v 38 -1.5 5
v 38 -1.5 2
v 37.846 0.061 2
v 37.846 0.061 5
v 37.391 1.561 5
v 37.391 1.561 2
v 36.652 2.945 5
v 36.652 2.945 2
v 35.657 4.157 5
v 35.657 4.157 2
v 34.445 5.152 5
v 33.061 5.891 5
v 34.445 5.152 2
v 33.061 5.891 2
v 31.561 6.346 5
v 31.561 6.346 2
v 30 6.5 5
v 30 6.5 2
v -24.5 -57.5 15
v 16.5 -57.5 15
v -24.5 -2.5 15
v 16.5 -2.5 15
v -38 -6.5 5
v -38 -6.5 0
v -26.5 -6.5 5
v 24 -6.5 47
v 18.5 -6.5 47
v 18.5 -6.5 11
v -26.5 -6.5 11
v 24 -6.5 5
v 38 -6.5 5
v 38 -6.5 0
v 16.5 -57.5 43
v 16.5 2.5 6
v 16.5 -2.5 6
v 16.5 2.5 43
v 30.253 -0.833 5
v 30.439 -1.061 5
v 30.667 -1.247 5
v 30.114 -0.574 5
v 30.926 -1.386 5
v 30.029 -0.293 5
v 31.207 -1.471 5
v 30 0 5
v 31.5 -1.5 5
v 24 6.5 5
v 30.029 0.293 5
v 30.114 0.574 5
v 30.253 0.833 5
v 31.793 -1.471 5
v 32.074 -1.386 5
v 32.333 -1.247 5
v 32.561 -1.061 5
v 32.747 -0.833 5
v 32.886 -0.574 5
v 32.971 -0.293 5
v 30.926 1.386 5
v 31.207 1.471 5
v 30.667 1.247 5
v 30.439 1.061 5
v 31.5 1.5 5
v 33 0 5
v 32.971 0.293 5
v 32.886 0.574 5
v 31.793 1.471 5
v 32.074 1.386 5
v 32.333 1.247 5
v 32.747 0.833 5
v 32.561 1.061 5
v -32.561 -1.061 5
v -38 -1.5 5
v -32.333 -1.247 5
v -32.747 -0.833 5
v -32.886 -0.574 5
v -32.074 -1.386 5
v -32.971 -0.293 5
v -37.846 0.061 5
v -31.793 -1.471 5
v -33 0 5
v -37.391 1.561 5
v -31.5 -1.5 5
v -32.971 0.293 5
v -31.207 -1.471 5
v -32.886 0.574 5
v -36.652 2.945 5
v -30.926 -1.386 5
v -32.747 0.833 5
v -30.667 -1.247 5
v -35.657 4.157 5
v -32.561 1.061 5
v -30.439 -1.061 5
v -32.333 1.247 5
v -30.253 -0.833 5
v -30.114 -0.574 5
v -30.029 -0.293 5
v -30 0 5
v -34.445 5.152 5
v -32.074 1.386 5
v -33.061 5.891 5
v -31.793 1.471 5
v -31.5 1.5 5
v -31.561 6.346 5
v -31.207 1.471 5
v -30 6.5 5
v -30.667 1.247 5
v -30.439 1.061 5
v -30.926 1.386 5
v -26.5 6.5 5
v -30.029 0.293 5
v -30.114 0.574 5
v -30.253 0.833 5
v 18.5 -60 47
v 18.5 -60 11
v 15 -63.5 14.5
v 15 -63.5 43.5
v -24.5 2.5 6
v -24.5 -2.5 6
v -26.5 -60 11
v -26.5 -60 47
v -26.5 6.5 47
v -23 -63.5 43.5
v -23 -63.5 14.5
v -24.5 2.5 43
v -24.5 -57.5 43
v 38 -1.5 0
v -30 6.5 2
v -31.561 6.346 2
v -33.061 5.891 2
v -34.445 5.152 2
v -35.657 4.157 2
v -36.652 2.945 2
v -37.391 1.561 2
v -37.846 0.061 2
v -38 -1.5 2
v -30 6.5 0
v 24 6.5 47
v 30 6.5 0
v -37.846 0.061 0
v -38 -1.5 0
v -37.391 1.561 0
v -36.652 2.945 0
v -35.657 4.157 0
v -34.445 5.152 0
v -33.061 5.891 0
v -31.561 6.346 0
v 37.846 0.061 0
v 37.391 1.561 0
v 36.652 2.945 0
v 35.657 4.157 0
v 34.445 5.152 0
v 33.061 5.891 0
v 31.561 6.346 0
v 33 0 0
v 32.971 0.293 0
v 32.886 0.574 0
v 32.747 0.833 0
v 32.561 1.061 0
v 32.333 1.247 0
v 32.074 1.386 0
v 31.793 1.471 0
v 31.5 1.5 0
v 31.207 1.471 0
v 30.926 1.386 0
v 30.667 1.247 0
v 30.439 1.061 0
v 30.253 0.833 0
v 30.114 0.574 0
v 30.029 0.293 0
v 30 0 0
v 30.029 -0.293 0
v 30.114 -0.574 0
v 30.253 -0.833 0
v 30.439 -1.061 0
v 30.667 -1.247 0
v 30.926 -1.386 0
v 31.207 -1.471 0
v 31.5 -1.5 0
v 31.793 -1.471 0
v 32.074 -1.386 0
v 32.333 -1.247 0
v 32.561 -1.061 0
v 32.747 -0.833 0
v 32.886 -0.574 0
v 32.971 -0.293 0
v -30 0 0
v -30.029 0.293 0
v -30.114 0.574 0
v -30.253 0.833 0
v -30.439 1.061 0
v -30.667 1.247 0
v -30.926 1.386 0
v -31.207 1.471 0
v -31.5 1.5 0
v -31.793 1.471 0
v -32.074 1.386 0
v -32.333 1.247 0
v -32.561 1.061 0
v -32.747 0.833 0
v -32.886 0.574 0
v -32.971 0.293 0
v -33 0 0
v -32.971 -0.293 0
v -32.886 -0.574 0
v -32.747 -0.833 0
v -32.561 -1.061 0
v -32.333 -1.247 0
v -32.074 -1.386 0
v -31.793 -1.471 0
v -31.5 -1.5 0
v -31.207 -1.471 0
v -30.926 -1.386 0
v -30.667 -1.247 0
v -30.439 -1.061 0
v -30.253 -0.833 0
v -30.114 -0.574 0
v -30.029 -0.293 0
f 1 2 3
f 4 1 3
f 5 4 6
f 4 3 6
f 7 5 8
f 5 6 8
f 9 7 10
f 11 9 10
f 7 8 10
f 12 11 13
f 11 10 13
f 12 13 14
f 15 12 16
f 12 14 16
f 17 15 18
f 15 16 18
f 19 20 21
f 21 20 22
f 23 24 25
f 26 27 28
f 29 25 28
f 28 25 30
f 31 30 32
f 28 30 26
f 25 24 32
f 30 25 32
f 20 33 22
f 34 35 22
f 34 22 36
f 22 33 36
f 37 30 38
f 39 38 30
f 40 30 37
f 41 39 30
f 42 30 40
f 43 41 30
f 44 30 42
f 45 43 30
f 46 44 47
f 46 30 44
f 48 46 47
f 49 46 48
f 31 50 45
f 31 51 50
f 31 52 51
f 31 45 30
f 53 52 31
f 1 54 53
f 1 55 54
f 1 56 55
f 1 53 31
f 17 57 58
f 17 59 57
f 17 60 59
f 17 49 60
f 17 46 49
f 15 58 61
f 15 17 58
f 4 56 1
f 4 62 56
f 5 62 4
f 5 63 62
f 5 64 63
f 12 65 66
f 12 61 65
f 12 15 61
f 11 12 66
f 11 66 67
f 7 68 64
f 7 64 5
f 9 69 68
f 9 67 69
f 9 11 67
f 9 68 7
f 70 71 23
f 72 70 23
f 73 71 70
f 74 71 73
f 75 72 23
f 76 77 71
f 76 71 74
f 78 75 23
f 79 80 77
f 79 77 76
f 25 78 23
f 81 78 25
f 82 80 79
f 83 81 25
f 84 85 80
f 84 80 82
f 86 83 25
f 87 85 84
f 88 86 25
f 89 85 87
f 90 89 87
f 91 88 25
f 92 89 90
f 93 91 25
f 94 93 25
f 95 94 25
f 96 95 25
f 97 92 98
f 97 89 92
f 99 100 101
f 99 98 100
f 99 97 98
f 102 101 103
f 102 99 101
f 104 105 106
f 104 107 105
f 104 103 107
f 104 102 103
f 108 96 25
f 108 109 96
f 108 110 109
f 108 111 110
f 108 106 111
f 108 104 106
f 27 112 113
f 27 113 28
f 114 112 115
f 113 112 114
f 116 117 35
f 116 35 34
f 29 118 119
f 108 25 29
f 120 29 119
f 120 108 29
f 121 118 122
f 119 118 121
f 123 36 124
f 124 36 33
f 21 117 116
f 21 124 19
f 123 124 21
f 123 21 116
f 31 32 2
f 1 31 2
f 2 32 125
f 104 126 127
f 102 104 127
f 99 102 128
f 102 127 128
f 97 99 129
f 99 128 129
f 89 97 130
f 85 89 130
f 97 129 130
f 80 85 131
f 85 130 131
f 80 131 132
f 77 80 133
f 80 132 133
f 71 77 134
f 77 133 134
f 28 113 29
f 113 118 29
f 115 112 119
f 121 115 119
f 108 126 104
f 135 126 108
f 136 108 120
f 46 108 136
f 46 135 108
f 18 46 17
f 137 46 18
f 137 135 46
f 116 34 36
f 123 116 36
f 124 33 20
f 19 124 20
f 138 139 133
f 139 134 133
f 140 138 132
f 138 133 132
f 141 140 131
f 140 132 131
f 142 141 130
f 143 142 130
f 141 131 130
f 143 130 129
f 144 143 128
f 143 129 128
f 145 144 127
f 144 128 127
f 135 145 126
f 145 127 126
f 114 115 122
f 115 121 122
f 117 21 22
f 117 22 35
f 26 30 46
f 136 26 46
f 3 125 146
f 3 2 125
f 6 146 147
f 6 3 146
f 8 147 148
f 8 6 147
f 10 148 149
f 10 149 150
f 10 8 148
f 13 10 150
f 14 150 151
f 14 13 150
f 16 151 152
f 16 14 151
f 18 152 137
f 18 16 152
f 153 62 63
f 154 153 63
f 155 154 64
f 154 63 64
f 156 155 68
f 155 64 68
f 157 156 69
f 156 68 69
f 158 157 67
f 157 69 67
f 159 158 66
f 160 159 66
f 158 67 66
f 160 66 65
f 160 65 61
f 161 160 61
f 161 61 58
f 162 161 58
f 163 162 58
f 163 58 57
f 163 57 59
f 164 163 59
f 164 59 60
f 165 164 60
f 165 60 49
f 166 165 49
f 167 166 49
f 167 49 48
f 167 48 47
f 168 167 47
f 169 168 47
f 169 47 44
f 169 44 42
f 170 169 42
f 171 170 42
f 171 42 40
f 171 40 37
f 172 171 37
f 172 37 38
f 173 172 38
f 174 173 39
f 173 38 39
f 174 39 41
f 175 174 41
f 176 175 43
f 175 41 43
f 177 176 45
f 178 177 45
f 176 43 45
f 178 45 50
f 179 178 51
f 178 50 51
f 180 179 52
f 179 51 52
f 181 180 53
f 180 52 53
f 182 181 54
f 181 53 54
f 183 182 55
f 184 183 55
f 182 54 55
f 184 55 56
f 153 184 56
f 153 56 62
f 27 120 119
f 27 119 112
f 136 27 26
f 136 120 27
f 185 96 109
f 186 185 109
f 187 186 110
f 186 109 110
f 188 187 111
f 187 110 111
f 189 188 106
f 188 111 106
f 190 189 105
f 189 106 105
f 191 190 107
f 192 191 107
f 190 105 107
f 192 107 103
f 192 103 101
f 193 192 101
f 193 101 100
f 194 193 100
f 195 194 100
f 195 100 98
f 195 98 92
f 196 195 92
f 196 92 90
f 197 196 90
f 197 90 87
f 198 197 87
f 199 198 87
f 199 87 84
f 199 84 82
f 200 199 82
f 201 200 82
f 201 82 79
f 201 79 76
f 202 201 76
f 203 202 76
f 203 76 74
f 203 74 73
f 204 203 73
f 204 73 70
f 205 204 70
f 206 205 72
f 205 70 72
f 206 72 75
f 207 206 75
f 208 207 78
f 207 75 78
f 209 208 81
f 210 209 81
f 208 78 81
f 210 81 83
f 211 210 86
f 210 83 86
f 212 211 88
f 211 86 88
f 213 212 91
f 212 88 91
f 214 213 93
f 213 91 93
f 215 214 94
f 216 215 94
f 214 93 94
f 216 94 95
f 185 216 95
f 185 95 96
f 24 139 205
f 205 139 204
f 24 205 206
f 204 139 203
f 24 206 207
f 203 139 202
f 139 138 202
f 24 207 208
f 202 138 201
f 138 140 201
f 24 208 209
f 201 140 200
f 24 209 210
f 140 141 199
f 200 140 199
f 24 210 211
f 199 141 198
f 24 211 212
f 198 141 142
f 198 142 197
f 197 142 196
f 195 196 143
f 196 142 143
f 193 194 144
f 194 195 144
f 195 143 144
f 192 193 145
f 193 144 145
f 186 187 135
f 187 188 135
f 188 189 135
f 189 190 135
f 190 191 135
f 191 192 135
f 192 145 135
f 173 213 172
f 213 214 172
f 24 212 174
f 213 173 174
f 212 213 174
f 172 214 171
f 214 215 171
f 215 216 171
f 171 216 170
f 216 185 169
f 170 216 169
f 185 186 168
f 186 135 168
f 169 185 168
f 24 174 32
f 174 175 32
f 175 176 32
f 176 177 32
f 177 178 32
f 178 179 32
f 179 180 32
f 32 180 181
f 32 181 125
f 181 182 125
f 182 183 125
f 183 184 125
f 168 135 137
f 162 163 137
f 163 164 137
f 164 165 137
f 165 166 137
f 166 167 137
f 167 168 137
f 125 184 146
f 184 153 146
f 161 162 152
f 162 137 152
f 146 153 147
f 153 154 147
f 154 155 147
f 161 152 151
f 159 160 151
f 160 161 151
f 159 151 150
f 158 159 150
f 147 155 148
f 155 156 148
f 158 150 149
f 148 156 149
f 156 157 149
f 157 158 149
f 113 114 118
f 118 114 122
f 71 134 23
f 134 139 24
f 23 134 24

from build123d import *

# Parameters (mm, degrees)
F0_W      = 76
F0_H      = 13
F1_DEPTH  = 2
F2_R      = 8
F3_W      = 43
F3_H      = 13
F4_DEPTH  = 9
F5_W      = 43
F5_H      = 36
F6_DEPTH  = 70
F8_DEPTH  = 41
F10_DEPTH = 2
F12_DEPTH = 3
F13_R     = 1.5
F14_DEPTH = 25
F15_W     = 5.5
F15_H     = 13
F16_DEPTH = 42
F17_SIZE  = 3.5


with BuildPart() as f1:
    # F0 (on Top) → F1 (new body)
    with BuildSketch(Plane.XY):
        Rectangle(F0_W, F0_H)
    extrude(amount=F1_DEPTH)

    # F2
    f2_edges = [f1.edges().sort_by_distance(p)[0] for p in [
        (-38, 6.5, 1),
        (38, 6.5, 1),
    ]]
    fillet(f2_edges, radius=F2_R)

    # F3 (on face) → F4 (join)
    with BuildSketch(Plane.XY.offset(2)):
        with Locations((-5, 0)):
            Rectangle(F3_W, F3_H)
    extrude(amount=F4_DEPTH)

    # F5 (on face) → F6 (join)
    with BuildSketch(Plane(origin=(0, 6.5, 0), x_dir=(-1, 0, 0), z_dir=(0, 1, 0))):
        with Locations((5, 29)):
            Rectangle(F5_W, F5_H)
    extrude(amount=-F6_DEPTH)

    # F7 (on face) → F8 (cut)
    with BuildSketch(Plane.YZ.offset(16.5)):
        Polygon((-57.5, 15), (-2.5, 15), (-2.5, 6), (2.5, 6), (2.5, 43), (-57.5, 43), align=None)
    extrude(amount=-F8_DEPTH, mode=Mode.SUBTRACT)

    # F9 (on face) → F10 (join)
    with BuildSketch(Plane.YZ.offset(16.5)):
        Polygon((-63.5, 11), (-6.5, 11), (-6.5, 2), (6.5, 2), (6.5, 47), (-63.5, 47), align=None)
    extrude(amount=F10_DEPTH)

    # F11 (on face) → F12 (join)
    with BuildSketch(Plane.XY.offset(2)):
        with BuildLine():
            Line((-38, -6.5), (-26.5, -6.5))
            Line((-26.5, -6.5), (-26.5, 6.5))
            Line((-26.5, 6.5), (-30, 6.5))
            ThreePointArc((-30, 6.5), (-35.656854, 4.156854), (-38, -1.5))
            Line((-38, -1.5), (-38, -6.5))
        make_face()
        with BuildLine():
            ThreePointArc((38, -1.5), (35.656854, 4.156854), (30, 6.5))
            Line((30, 6.5), (18.5, 6.5))
            Line((18.5, 6.5), (18.5, -6.5))
            Line((18.5, -6.5), (38, -6.5))
            Line((38, -6.5), (38, -1.5))
        make_face()
    extrude(amount=F12_DEPTH)

    # F13 (on face) → F14 (cut)
    with BuildSketch(Plane.XY.offset(5)):
        with Locations((-31.5, 0)):
            Circle(F13_R)
        with Locations((31.5, 0)):
            Circle(F13_R)
    extrude(amount=-F14_DEPTH, mode=Mode.SUBTRACT)

    # F15 (on face) → F16 (join)
    with BuildSketch(Plane.XY.offset(5)):
        with Locations((21.25, 0)):
            Rectangle(F15_W, F15_H)
    extrude(amount=F16_DEPTH)

    # F17
    f17_edges = [f1.edges().sort_by_distance(p)[0] for p in [
        (18.5, -63.5, 29),
        (-4, -63.5, 47),
        (-4, -63.5, 11),
        (-26.5, -63.5, 29),
    ]]
    chamfer(f17_edges, length=F17_SIZE)


solid = f1.part
